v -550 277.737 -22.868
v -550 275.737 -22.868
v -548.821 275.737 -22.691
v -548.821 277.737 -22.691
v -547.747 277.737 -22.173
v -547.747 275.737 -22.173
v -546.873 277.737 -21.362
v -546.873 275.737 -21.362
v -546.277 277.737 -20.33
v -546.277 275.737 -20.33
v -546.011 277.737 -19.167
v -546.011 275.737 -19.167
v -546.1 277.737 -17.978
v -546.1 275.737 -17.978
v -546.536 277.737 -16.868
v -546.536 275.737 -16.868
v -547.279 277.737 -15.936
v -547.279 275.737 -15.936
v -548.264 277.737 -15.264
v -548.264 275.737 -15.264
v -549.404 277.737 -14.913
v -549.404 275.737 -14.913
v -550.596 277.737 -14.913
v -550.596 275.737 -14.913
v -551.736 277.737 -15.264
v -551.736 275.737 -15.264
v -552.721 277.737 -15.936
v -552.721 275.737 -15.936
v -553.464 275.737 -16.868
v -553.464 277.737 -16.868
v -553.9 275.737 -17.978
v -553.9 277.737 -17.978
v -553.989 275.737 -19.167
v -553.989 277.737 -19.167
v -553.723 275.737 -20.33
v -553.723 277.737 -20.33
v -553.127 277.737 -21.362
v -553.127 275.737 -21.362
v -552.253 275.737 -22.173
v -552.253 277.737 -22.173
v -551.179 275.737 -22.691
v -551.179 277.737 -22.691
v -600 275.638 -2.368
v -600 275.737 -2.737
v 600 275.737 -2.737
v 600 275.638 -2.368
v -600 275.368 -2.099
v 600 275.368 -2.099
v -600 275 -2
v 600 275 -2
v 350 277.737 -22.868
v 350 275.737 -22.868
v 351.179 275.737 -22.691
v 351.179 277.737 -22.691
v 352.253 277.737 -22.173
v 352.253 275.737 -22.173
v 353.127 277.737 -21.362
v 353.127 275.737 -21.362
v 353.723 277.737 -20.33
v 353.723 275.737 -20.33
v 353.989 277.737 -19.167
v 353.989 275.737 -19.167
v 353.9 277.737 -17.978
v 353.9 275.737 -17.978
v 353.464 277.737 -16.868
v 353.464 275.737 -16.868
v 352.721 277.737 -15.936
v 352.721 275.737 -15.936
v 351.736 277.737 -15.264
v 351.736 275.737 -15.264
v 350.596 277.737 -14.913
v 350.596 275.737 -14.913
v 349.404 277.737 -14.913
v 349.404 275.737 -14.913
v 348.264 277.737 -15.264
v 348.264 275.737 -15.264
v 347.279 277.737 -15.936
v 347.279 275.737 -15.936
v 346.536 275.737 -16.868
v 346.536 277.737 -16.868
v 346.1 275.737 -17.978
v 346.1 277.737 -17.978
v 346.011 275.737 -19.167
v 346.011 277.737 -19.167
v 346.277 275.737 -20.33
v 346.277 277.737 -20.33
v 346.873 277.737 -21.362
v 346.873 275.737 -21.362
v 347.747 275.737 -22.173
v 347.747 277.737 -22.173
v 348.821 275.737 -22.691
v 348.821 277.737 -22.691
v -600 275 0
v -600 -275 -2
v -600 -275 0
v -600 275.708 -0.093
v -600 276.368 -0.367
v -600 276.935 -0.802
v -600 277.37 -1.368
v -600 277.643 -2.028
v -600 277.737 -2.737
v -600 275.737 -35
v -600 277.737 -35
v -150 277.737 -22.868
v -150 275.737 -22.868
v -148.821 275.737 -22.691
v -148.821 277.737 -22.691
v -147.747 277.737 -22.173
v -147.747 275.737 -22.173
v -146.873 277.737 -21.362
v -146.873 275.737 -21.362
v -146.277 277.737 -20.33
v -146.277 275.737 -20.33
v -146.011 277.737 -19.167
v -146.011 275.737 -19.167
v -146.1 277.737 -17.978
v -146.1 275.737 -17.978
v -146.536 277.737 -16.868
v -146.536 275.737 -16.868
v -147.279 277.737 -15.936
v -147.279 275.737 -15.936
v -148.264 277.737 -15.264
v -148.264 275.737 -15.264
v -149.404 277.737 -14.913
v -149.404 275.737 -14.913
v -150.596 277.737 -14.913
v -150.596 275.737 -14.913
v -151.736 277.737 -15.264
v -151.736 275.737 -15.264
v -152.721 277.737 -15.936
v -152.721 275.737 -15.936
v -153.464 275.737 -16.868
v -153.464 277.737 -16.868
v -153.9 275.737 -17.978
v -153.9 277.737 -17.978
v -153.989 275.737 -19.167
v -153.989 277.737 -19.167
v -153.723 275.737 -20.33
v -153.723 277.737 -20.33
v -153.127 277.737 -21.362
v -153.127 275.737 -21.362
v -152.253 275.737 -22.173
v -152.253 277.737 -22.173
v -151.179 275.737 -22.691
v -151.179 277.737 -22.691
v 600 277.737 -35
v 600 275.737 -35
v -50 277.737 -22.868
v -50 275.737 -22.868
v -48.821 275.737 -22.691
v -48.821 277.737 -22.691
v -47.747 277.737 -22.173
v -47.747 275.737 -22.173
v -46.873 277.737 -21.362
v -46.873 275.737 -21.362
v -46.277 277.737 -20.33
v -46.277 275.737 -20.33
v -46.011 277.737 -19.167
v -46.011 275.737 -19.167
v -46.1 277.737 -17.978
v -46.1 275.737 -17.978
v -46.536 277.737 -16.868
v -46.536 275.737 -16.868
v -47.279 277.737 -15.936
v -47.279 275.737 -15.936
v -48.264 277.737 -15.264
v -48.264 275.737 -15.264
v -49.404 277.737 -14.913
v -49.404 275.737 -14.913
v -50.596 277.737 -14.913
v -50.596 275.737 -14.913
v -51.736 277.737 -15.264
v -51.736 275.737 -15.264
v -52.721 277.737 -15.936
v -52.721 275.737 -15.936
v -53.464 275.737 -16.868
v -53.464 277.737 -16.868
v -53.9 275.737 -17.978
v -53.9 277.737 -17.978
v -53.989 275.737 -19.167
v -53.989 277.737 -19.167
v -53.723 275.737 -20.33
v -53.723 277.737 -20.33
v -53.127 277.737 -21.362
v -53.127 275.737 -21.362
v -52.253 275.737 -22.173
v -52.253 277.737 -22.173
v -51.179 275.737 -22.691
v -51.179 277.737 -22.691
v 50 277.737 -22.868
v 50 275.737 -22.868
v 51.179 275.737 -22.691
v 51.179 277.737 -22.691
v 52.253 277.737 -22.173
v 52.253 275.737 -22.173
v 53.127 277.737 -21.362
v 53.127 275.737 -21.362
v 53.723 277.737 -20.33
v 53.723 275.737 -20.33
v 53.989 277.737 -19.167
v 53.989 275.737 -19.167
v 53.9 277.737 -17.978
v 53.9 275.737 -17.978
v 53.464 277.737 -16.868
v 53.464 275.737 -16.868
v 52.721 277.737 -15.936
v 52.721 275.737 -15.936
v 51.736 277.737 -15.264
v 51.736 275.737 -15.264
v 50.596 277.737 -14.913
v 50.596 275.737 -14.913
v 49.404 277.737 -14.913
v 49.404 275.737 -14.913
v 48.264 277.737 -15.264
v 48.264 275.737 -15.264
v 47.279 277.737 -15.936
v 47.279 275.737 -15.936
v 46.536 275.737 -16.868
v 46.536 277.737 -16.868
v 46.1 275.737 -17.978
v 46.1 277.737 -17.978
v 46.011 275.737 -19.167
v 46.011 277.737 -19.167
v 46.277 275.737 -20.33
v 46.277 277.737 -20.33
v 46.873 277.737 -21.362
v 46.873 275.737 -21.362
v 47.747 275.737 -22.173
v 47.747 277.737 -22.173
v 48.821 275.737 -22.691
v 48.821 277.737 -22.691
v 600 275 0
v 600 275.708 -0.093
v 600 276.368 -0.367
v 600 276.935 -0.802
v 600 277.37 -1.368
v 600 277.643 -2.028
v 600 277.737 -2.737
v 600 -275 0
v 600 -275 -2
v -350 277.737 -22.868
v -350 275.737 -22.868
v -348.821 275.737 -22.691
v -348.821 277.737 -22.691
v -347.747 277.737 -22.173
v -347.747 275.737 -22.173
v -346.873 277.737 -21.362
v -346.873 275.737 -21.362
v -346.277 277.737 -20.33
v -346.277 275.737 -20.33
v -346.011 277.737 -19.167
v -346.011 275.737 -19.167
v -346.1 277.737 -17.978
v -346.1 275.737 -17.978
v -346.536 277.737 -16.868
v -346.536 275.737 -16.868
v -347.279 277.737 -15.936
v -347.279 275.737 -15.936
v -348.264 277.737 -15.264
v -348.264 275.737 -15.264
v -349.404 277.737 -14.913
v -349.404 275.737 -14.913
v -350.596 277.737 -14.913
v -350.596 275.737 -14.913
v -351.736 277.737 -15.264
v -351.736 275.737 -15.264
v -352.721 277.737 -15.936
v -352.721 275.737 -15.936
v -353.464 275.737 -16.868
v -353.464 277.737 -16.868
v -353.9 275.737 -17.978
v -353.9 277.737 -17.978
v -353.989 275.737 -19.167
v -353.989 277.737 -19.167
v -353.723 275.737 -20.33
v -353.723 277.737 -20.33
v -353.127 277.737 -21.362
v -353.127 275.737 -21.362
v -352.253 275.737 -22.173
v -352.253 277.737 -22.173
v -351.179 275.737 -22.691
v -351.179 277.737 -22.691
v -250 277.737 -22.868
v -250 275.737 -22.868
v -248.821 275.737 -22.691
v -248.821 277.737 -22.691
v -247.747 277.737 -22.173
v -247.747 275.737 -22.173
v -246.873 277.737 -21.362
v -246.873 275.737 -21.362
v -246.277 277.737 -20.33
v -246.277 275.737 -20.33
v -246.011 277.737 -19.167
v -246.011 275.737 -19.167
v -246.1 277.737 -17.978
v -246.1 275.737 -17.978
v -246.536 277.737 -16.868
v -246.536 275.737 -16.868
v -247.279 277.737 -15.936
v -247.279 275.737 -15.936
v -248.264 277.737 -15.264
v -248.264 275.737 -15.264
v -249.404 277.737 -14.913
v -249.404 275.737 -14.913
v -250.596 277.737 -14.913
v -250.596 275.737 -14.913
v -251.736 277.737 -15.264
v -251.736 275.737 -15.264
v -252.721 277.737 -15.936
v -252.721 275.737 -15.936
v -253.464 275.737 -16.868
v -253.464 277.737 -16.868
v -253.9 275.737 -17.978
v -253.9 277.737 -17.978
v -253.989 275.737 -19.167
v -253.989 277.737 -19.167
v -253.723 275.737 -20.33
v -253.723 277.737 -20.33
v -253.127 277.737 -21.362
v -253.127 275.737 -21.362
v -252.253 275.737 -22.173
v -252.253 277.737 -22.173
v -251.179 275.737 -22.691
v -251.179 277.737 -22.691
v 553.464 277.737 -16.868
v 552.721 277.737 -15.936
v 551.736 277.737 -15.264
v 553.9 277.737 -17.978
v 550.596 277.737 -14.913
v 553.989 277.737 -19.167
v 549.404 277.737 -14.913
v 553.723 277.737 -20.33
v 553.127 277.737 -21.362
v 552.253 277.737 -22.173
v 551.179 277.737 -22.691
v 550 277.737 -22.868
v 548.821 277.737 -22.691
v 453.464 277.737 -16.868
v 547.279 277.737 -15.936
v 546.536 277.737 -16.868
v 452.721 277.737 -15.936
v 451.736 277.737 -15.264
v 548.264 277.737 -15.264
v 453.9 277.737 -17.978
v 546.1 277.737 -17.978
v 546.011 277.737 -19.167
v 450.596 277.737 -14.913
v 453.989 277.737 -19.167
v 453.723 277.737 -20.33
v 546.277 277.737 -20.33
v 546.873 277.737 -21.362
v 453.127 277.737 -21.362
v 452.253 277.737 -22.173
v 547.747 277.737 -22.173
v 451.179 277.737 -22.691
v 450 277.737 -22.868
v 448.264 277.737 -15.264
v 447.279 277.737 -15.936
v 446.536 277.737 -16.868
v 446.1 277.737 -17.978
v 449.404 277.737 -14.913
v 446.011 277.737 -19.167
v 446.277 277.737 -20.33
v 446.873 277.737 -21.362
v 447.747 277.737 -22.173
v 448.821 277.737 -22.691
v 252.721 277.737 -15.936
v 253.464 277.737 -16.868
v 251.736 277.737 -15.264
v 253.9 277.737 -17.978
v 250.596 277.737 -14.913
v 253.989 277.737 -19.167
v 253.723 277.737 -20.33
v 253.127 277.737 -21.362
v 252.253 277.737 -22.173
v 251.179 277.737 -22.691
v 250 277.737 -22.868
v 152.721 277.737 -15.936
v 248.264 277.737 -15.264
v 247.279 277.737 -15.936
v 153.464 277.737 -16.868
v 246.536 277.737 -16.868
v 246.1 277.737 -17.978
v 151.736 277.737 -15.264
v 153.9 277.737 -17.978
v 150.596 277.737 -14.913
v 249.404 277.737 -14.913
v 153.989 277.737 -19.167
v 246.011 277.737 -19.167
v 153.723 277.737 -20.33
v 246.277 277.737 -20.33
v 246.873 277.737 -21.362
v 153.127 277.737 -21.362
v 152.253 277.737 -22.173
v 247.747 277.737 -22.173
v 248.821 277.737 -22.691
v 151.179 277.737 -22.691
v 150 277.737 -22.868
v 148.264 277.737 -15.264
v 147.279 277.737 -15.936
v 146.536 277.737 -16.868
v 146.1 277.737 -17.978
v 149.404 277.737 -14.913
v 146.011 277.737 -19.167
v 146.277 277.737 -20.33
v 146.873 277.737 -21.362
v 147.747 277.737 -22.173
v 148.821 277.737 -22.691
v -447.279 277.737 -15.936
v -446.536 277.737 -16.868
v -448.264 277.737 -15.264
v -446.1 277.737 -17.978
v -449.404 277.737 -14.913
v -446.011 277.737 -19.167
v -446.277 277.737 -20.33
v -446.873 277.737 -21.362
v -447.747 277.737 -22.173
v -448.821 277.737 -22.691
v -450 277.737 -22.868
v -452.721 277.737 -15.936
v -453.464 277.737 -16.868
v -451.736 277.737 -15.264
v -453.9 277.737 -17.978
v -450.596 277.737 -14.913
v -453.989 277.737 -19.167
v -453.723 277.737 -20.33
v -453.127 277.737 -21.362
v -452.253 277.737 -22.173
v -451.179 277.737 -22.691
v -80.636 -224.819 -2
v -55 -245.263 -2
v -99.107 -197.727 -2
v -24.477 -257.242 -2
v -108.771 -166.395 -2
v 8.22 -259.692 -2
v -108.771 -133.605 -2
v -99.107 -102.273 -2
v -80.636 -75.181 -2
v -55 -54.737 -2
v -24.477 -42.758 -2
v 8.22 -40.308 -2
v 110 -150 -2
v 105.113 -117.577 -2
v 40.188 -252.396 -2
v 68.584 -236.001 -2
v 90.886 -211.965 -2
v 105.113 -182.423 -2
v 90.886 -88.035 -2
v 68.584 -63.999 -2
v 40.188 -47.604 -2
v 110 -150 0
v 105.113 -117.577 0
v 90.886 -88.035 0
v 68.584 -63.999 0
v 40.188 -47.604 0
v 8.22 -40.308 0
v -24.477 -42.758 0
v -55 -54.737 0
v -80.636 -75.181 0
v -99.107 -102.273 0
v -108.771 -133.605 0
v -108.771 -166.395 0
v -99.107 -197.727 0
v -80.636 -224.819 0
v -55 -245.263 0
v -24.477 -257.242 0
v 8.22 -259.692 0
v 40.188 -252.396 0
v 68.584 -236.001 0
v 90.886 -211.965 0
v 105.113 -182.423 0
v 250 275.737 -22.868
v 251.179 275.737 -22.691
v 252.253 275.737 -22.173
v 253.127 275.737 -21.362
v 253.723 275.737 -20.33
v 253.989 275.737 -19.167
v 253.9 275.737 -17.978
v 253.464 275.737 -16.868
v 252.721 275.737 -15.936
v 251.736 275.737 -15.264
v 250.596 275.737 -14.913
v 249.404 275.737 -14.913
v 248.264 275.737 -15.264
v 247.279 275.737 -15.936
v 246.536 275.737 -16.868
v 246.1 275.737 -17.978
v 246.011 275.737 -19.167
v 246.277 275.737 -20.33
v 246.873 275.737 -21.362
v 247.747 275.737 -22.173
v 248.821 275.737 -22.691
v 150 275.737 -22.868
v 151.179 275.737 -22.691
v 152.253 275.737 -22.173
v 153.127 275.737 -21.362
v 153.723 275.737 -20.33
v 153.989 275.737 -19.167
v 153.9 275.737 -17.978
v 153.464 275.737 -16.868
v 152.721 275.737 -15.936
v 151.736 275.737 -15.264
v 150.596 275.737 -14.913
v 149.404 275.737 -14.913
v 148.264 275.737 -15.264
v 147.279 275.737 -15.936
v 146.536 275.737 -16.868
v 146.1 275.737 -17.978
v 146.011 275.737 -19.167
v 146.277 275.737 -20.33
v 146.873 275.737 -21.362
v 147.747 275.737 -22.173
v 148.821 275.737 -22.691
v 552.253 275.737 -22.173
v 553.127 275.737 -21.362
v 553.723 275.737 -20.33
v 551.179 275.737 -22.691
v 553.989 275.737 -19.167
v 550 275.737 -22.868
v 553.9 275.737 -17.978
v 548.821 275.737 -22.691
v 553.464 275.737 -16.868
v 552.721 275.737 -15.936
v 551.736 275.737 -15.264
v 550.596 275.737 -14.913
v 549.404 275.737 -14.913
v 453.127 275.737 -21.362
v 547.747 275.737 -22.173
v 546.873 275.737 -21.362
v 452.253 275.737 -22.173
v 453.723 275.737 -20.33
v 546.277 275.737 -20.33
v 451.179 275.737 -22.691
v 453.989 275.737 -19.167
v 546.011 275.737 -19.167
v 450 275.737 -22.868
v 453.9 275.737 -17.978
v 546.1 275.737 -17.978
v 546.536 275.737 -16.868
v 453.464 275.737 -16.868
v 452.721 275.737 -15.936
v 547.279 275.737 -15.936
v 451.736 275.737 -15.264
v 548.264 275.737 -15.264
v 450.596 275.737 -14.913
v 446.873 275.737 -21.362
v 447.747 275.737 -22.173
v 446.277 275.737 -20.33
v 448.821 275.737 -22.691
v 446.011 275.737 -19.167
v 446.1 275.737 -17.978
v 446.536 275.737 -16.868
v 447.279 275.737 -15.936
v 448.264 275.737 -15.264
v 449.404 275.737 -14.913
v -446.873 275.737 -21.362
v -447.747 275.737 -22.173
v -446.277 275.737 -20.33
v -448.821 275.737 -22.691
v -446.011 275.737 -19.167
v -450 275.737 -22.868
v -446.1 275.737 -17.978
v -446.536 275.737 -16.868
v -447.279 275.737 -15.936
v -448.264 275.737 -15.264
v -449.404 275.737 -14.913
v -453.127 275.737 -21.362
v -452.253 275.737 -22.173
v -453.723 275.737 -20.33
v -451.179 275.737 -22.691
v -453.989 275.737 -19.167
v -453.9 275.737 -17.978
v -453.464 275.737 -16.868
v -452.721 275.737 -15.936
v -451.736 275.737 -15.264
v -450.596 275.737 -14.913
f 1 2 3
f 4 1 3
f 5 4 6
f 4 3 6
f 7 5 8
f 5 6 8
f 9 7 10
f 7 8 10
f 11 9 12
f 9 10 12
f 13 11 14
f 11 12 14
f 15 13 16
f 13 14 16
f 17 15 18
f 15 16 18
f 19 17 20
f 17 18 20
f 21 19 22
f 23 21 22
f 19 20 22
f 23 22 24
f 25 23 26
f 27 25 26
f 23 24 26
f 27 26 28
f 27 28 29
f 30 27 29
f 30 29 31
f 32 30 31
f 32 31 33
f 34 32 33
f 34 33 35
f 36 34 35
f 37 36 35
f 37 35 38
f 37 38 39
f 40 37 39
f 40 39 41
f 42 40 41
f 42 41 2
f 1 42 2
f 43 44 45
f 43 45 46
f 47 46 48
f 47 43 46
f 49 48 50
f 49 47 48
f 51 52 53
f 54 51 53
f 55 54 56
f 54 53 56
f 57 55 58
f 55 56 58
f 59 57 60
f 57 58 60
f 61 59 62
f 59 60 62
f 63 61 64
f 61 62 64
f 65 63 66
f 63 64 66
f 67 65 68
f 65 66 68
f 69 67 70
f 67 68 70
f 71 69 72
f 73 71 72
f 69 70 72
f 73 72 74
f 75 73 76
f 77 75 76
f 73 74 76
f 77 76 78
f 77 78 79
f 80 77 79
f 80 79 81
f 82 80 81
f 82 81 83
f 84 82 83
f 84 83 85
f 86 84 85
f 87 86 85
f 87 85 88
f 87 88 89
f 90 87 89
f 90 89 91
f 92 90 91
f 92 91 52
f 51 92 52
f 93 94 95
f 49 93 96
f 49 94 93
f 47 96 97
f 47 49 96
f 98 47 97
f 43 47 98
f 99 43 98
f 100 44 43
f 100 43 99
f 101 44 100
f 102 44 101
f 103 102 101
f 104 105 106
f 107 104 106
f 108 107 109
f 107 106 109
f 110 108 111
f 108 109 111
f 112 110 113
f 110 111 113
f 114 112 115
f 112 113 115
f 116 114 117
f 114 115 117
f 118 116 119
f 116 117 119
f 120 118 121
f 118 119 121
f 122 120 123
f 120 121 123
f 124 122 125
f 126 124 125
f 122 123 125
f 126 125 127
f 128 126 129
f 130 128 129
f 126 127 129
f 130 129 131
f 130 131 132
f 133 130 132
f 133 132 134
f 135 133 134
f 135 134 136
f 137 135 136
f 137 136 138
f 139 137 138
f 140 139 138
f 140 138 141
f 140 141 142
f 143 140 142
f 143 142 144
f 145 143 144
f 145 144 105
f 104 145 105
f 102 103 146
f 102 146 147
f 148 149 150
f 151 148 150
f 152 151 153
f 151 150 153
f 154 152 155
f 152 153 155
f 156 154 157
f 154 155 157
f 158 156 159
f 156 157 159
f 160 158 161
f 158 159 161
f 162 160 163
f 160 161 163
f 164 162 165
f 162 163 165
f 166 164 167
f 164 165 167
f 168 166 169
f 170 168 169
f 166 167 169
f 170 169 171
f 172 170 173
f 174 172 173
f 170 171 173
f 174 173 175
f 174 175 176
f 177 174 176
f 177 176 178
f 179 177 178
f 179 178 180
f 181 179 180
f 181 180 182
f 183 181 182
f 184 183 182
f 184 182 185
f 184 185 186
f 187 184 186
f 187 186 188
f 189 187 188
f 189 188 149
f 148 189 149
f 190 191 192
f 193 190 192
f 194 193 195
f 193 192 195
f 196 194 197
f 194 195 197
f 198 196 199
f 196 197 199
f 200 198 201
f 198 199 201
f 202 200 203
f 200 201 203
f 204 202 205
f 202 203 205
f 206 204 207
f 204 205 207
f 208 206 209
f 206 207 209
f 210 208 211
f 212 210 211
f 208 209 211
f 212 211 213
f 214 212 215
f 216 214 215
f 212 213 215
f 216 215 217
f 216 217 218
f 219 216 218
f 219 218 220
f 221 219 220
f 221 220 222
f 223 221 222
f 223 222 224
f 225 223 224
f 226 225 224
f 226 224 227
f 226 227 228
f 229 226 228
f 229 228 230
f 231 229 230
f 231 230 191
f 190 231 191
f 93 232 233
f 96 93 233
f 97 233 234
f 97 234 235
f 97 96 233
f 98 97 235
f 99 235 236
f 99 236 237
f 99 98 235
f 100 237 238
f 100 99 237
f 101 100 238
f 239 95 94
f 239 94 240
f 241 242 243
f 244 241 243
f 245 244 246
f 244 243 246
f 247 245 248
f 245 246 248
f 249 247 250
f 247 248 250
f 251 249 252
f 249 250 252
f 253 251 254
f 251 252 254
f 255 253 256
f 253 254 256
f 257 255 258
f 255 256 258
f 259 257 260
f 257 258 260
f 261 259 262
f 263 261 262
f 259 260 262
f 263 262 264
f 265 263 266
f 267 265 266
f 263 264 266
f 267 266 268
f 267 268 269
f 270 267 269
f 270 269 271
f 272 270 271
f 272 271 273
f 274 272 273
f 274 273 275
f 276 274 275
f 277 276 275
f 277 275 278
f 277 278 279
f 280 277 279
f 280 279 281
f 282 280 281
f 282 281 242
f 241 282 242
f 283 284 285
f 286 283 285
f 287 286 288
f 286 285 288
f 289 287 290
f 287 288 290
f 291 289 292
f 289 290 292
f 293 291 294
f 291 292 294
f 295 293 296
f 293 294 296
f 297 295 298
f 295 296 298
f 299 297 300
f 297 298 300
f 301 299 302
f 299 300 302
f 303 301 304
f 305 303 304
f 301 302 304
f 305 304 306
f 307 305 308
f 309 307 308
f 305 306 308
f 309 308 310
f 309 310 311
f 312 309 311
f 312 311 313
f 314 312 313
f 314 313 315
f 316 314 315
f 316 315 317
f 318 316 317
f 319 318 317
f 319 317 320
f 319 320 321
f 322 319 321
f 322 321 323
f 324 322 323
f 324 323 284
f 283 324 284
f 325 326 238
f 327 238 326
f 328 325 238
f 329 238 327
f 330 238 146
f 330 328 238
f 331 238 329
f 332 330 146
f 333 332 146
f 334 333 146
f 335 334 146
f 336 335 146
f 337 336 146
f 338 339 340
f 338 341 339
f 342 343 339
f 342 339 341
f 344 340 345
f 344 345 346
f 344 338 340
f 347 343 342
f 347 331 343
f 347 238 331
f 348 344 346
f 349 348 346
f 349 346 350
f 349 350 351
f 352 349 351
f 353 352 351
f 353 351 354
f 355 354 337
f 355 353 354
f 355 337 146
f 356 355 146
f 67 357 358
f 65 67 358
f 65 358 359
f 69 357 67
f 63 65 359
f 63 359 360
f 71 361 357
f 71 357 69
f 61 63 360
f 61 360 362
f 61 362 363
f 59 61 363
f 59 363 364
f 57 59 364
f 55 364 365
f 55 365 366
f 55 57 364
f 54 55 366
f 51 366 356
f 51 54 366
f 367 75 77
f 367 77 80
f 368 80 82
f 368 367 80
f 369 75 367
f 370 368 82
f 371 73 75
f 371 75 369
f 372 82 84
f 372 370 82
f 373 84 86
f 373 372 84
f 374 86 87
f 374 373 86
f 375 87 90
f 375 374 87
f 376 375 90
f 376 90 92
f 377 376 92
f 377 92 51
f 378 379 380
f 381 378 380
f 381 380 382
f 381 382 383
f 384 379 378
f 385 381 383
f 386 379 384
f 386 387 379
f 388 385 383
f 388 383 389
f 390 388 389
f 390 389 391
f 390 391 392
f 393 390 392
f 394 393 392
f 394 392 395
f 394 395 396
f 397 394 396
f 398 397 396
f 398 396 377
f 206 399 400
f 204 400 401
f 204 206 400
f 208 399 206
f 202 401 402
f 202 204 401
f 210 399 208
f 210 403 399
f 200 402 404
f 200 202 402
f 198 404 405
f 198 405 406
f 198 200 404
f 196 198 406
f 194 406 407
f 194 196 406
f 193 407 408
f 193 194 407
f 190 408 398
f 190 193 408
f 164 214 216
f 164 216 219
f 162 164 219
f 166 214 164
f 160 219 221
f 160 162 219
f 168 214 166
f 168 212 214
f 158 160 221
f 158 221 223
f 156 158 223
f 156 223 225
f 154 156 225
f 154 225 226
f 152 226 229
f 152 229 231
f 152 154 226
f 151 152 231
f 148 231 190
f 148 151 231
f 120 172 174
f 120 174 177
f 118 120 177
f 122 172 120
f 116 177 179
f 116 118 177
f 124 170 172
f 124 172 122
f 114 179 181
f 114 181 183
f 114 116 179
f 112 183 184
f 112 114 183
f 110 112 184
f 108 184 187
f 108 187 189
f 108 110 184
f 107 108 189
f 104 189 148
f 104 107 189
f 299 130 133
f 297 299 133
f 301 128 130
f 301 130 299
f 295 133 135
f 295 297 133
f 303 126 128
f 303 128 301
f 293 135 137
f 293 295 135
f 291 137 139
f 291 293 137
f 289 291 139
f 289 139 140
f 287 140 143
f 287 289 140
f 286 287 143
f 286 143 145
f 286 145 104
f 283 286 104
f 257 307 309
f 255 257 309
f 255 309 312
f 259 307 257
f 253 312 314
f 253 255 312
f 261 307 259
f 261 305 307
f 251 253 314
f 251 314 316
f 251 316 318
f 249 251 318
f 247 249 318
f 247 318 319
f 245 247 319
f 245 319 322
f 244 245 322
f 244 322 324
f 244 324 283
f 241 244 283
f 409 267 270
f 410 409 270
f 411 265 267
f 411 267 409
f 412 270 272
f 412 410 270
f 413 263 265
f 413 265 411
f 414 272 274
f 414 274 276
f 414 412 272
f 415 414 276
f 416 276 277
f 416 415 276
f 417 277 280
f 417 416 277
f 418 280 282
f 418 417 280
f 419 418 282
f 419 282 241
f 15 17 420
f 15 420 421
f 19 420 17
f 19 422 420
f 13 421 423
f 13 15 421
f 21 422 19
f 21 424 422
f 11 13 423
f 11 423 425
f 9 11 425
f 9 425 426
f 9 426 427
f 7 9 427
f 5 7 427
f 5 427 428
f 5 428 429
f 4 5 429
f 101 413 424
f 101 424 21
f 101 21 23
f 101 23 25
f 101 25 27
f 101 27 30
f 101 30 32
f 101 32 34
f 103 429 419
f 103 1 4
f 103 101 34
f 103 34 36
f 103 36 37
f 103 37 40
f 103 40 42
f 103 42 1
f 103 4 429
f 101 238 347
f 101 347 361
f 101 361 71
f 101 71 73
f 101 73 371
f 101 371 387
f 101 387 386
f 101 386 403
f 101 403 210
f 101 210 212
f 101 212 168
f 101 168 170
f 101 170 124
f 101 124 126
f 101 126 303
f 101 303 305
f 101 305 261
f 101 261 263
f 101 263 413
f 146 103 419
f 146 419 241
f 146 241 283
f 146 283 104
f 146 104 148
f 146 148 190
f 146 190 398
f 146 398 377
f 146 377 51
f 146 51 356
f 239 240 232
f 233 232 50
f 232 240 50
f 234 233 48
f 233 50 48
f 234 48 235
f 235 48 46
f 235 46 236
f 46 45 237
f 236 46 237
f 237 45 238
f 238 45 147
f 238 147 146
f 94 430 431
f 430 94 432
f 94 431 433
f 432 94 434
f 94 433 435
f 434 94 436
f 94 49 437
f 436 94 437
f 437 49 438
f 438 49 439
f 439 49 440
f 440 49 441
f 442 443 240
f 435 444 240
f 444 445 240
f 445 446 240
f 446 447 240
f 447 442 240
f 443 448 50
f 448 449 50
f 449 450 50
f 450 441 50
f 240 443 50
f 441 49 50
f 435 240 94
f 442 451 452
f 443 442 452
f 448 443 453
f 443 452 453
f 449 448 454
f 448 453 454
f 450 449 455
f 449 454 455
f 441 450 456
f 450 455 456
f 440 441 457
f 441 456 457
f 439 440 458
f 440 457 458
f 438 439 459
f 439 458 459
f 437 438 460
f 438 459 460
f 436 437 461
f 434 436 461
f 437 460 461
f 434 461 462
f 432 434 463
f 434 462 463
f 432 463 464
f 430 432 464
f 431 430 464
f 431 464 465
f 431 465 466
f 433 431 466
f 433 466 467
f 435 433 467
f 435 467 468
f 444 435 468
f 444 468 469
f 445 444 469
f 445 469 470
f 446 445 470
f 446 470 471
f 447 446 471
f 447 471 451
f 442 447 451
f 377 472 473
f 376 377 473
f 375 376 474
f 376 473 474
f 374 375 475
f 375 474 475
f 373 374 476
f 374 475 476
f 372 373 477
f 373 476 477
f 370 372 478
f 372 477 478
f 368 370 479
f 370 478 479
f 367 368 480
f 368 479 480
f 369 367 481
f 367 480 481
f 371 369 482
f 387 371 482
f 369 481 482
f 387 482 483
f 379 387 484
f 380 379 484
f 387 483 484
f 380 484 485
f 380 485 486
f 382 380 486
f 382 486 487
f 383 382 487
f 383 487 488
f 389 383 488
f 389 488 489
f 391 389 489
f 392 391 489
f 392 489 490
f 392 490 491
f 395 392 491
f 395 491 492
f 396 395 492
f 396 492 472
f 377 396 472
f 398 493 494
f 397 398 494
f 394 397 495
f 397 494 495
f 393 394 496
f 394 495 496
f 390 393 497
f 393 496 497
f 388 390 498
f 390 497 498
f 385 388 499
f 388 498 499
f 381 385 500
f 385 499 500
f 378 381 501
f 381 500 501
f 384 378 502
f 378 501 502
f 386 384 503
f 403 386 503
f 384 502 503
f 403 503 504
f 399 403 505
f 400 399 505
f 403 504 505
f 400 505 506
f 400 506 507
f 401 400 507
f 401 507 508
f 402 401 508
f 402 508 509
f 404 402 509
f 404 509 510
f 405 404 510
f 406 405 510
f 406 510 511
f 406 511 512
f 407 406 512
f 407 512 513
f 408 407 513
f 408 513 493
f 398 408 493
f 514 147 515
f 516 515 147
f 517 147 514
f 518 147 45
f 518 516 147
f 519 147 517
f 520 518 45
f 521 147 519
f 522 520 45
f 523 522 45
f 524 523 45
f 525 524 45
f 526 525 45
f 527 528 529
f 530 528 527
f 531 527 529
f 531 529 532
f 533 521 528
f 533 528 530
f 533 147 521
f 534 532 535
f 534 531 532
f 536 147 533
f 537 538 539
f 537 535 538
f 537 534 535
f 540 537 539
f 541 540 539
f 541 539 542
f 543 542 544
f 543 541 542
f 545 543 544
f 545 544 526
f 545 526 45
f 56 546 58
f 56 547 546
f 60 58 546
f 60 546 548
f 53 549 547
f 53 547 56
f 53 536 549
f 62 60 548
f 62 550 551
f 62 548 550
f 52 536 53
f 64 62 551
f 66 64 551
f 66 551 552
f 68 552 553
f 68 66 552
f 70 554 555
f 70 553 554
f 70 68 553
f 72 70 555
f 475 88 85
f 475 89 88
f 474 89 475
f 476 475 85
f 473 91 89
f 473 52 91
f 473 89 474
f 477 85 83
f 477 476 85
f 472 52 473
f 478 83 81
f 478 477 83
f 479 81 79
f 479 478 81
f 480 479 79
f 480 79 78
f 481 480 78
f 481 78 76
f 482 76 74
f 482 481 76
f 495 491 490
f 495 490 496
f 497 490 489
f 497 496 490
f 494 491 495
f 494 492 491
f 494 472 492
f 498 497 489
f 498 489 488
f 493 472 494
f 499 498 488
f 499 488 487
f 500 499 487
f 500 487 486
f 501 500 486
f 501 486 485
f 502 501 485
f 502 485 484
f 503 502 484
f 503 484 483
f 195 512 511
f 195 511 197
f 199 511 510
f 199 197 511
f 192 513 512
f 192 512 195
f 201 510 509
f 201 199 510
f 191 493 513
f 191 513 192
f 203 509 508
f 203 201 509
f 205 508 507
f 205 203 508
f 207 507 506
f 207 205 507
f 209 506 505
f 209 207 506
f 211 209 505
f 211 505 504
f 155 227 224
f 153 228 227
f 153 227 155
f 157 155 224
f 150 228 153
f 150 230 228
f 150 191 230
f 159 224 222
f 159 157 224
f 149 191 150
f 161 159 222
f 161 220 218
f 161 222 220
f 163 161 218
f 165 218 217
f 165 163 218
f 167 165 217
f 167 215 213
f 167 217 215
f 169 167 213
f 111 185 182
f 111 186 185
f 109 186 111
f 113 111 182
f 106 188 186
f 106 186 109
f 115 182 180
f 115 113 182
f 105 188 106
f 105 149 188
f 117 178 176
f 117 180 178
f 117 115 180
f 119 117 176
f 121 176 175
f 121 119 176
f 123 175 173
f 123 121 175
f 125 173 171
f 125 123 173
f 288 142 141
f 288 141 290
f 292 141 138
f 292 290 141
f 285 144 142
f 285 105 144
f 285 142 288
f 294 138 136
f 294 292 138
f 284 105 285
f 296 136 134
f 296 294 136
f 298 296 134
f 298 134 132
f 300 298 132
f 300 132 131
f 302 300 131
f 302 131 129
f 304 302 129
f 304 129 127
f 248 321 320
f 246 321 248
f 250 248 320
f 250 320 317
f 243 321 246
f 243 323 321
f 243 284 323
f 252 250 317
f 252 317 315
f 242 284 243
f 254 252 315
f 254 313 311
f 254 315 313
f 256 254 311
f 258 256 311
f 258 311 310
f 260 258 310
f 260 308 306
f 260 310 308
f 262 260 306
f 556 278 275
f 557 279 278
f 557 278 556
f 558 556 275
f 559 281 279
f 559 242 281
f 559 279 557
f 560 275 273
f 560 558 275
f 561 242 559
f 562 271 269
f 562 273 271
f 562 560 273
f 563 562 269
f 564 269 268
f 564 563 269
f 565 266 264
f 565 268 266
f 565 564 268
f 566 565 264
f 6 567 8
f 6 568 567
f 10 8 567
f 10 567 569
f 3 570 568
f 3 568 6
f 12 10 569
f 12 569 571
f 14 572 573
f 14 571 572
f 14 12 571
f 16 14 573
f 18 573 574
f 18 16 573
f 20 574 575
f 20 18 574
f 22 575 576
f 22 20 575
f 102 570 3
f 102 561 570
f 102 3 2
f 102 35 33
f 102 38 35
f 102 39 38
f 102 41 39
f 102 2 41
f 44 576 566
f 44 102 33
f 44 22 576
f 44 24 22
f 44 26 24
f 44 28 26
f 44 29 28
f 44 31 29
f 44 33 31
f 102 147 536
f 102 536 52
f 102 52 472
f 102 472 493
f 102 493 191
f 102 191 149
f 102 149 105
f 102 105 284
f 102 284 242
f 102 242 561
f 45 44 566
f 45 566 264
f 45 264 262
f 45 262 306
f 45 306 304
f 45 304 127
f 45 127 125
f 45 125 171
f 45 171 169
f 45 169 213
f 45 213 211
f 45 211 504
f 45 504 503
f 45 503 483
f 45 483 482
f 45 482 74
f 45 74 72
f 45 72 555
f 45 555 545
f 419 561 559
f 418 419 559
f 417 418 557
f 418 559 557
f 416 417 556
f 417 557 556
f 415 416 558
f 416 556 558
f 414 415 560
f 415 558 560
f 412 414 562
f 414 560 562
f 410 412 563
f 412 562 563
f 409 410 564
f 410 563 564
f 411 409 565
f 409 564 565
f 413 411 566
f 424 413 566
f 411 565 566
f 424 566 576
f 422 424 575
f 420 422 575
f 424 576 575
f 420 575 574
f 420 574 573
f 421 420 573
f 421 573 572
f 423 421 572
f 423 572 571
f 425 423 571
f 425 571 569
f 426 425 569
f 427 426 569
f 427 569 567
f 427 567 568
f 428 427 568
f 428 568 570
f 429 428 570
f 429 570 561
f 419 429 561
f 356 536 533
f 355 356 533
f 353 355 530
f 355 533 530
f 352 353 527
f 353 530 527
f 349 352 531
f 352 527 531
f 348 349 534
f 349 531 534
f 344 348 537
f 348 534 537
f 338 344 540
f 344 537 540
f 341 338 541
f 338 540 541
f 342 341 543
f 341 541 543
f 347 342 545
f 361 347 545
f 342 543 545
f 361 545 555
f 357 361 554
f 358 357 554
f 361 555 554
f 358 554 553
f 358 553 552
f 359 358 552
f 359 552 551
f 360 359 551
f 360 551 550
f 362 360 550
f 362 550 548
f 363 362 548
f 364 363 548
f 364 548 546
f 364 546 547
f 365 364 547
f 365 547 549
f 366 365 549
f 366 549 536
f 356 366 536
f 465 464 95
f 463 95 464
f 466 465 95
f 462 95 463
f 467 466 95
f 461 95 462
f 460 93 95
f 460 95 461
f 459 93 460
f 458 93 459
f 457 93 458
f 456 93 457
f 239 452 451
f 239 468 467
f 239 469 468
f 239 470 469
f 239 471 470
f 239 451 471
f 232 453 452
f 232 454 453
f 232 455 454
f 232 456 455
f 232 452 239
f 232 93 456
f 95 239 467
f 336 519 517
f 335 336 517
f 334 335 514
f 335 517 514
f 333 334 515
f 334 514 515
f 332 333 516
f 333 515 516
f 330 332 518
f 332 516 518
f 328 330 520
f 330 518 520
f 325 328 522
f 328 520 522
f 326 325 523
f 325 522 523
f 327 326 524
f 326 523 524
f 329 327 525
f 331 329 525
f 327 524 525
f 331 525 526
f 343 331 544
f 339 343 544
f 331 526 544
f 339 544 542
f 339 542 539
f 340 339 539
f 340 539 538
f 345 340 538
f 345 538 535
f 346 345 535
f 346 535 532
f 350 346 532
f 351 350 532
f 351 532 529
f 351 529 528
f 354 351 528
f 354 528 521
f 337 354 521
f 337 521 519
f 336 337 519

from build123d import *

# Parameters (mm, degrees)
SKETCH1_W          = 1200
SKETCH1_H          = 550
BASE_FLANGE1_DEPTH = 2
EDGE_FLANGE1_DEPTH = 1200
SKETCH9_R          = 4
CUT_EXTRUDE1_DEPTH = 10
SKETCH10_R         = 110
CUT_EXTRUDE2_DEPTH = 10


# Sheet-metal steps are written as plain solids
with BuildPart() as part:
    # Base-Flange1: sheet metal written as solids
    # Sketch1 → Base-Flange1 (new body)
    with BuildSketch(Plane.XY):
        Rectangle(SKETCH1_W, SKETCH1_H)
    extrude(amount=-BASE_FLANGE1_DEPTH)

    # Edge-Flange1: sheet metal written as solids
    # Edge-Flange1 section (on a plane across the edge) → Edge-Flange1 (add)
    with BuildSketch(Plane(origin=(-600, 275.7366, -2), x_dir=(0, -1, 0), z_dir=(1, 0, 0))):
        with BuildLine():
            Line((-2, 0.7366), (-2, 33))
            Line((-2, 33), (0, 33))
            Line((0, 33), (0, 0.7366))
            ThreePointArc((0, 0.7366), (0.215745145, 0.215745145), (0.7366, 0))
            Line((0.7366, 0), (0.7366, -2))
            ThreePointArc((0.7366, -2), (-1.198468417, -1.198468417), (-2, 0.7366))
        make_face()
    extrude(amount=EDGE_FLANGE1_DEPTH)

    # Sketch9 → Cut-Extrude1 (cut)
    with BuildSketch(Plane.XZ.offset(-275.7366)):
        with Locations(Location((-550, -18.8683, 0), (0, 0, 270))):
            Circle(SKETCH9_R)
        with Locations(Location((-450, -18.8683, 0), (0, 0, 270))):
            Circle(SKETCH9_R)
        with Locations(Location((-350, -18.8683, 0), (0, 0, 270))):
            Circle(SKETCH9_R)
        with Locations(Location((-250, -18.8683, 0), (0, 0, 270))):
            Circle(SKETCH9_R)
        with Locations(Location((-150, -18.8683, 0), (0, 0, 270))):
            Circle(SKETCH9_R)
        with Locations(Location((-50, -18.8683, 0), (0, 0, 270))):
            Circle(SKETCH9_R)
        with Locations(Location((50, -18.8683, 0), (0, 0, 270))):
            Circle(SKETCH9_R)
        with Locations(Location((150, -18.8683, 0), (0, 0, 270))):
            Circle(SKETCH9_R)
        with Locations(Location((250, -18.8683, 0), (0, 0, 270))):
            Circle(SKETCH9_R)
        with Locations(Location((350, -18.8683, 0), (0, 0, 270))):
            Circle(SKETCH9_R)
        with Locations(Location((450, -18.8683, 0), (0, 0, 270))):
            Circle(SKETCH9_R)
        with Locations(Location((550, -18.8683, 0), (0, 0, 270))):
            Circle(SKETCH9_R)
    extrude(amount=-CUT_EXTRUDE1_DEPTH, mode=Mode.SUBTRACT)

    # Sketch10 → Cut-Extrude2 (cut)
    with BuildSketch(Plane.XY):
        with Locations((0, -150)):
            Circle(SKETCH10_R)
    extrude(amount=-CUT_EXTRUDE2_DEPTH, mode=Mode.SUBTRACT)


solid = part.part
